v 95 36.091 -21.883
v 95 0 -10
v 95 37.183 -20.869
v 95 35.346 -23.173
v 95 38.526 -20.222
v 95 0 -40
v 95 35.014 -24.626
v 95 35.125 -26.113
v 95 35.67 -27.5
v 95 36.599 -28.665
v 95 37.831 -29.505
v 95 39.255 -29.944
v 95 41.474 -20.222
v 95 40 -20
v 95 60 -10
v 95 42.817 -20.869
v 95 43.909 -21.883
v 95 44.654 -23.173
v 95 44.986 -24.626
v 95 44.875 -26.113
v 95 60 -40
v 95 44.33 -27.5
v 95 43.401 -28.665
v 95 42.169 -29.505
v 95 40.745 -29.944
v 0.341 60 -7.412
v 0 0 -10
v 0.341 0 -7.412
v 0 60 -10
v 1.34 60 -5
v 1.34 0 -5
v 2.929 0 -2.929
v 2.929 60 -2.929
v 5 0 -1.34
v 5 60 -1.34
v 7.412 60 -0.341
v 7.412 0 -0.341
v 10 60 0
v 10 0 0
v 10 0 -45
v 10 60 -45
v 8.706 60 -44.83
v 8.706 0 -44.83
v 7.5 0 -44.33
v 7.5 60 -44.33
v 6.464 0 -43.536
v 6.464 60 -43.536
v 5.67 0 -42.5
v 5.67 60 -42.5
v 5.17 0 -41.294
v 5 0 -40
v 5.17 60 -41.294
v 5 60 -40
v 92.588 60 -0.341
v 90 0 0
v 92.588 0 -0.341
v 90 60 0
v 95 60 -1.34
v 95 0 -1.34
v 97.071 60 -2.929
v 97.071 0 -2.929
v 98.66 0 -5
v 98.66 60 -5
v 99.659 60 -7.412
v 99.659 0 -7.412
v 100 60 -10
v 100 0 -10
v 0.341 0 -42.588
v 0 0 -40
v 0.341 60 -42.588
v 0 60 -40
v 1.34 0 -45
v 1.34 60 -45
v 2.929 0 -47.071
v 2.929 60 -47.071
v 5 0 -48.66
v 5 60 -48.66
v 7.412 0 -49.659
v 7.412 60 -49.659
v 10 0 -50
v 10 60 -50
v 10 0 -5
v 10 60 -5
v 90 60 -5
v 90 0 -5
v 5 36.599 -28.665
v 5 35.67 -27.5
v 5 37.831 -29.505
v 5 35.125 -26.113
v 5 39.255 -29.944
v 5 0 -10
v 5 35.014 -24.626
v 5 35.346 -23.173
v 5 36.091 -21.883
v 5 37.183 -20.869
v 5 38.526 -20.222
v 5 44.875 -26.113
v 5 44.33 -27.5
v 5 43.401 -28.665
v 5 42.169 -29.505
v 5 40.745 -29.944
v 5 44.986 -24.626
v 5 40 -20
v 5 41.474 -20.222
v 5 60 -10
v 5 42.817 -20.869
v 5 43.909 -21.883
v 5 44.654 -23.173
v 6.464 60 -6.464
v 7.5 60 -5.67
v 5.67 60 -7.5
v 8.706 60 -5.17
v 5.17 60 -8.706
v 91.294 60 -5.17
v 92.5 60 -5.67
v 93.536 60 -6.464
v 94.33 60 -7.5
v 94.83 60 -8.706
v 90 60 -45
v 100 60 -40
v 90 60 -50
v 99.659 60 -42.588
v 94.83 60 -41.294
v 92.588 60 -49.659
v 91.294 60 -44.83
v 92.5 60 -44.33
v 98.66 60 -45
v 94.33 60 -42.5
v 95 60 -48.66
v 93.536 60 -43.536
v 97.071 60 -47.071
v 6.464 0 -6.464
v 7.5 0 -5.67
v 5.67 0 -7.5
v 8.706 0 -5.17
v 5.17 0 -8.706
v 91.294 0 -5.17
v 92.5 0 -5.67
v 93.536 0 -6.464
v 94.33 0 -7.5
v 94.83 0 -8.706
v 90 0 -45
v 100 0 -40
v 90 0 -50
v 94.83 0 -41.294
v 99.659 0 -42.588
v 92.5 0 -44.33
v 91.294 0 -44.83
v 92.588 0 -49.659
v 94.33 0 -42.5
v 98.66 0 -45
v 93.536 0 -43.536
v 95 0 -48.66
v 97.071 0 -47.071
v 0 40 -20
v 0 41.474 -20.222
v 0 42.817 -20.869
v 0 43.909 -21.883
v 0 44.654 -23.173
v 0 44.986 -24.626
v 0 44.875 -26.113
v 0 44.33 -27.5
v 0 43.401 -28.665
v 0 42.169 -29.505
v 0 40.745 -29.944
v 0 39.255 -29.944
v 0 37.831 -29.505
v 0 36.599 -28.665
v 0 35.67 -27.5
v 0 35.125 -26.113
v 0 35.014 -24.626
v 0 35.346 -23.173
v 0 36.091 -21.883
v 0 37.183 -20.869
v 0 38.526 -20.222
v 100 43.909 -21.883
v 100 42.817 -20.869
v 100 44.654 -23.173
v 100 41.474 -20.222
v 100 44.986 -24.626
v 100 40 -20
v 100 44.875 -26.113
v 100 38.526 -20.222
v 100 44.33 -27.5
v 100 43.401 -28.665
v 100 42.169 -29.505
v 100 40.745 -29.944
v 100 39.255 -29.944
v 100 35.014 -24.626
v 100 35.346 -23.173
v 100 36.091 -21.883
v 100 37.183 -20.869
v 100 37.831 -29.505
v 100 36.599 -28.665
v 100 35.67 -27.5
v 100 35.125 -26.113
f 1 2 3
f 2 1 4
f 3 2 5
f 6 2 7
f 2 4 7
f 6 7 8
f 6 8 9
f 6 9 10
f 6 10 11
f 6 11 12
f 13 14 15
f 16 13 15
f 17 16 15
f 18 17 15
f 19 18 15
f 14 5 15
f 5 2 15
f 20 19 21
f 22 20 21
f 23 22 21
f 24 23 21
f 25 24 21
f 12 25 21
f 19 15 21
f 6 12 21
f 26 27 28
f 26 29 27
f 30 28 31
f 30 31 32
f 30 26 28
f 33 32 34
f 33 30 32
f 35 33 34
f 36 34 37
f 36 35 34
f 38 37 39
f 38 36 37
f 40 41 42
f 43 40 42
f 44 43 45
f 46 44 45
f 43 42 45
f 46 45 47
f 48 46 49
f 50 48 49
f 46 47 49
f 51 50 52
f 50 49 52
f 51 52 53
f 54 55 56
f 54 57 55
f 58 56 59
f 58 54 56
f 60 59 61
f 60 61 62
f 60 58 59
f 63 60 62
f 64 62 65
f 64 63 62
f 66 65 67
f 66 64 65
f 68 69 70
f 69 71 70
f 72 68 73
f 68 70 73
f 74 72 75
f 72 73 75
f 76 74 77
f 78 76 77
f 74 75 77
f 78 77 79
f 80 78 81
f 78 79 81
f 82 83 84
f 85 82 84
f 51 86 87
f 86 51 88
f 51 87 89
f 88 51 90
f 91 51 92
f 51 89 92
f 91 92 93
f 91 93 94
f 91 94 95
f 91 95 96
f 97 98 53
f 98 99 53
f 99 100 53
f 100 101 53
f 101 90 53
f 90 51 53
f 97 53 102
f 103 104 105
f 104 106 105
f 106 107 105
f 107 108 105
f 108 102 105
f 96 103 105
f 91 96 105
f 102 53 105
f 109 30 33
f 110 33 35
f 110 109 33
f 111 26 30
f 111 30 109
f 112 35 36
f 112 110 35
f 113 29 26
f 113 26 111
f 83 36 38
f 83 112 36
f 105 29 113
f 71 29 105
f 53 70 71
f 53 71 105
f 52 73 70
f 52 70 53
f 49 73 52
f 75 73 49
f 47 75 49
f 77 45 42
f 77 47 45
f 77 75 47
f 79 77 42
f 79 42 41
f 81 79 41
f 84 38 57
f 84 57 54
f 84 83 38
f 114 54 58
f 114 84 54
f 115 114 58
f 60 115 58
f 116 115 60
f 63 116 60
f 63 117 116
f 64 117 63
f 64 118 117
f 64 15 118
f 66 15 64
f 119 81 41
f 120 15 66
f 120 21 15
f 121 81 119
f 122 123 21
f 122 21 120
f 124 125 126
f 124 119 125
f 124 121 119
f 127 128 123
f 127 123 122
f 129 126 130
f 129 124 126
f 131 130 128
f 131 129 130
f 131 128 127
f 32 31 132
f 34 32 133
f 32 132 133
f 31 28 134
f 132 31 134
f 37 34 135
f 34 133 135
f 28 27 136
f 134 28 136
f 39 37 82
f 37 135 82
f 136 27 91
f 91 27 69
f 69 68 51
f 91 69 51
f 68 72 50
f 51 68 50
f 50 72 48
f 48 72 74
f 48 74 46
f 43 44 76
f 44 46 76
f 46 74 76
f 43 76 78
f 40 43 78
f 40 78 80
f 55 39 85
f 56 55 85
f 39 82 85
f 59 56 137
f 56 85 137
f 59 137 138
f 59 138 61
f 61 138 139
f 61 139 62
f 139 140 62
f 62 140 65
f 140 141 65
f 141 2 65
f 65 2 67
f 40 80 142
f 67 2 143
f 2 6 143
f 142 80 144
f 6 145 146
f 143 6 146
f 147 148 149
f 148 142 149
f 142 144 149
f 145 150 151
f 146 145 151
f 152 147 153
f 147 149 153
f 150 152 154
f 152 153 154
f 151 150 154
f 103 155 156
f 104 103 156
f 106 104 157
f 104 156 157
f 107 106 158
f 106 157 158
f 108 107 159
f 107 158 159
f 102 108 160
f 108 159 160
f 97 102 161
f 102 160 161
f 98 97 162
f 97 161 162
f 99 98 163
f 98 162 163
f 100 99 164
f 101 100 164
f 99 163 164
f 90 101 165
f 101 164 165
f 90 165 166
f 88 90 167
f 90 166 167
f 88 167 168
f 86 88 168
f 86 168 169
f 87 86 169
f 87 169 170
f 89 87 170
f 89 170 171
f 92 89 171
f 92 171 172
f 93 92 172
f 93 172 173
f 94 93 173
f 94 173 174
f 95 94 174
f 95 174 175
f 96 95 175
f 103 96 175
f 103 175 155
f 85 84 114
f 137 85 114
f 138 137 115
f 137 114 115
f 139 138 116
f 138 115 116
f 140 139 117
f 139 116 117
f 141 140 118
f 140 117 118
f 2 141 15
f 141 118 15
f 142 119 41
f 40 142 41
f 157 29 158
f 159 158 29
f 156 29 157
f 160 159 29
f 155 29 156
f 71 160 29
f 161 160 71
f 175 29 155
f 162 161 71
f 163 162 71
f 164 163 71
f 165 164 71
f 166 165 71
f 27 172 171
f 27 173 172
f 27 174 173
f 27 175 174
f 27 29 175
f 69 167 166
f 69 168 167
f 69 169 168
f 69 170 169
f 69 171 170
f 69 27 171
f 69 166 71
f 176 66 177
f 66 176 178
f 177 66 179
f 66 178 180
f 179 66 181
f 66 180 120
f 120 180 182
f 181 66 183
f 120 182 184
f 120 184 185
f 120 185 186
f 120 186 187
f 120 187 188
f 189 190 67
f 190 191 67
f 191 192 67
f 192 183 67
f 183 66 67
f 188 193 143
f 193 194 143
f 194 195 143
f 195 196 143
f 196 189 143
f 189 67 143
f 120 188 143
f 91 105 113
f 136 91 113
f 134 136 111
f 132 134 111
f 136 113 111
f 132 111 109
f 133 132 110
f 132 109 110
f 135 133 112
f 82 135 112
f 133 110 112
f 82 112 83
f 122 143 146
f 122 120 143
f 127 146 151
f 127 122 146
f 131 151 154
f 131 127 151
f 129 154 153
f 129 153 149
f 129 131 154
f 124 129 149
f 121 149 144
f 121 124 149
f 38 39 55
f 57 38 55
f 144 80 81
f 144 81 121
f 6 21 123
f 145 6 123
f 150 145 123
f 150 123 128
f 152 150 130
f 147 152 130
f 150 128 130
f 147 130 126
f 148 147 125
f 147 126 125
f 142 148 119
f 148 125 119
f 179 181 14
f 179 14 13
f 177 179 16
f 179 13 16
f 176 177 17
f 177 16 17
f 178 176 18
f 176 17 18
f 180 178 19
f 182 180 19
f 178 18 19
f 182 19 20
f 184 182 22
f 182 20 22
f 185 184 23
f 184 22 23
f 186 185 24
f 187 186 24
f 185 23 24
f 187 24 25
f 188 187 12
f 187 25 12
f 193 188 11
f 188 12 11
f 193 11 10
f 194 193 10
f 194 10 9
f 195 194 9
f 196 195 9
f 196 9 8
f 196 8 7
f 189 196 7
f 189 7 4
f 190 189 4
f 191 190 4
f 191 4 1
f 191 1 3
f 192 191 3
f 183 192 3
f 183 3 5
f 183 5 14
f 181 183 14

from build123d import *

# Parameters (mm, degrees)
SKETCH1_W           = 100
SKETCH1_H           = 50
BOSS_EXTRUDE1_DEPTH = 60
FILLET2_R           = 10
CUT_EXTRUDE1_DEPTH  = 80
SKETCH2_R           = 5
CUT_EXTRUDE2_DEPTH  = 127.885775404


with BuildPart() as part:
    # Sketch1 → Boss-Extrude1 (new body)
    with BuildSketch(Plane(origin=(0, 0, 0), x_dir=(1, 0, 0), z_dir=(0, 1, 0))):
        with Locations((50, 25)):
            Rectangle(SKETCH1_W, SKETCH1_H)
    extrude(amount=BOSS_EXTRUDE1_DEPTH)

    # Fillet2
    fillet2_edges = [part.edges().sort_by_distance(p)[0] for p in [
        (0, 30, -50),
        (100, 30, -50),
        (100, 30, 0),
        (0, 30, 0),
    ]]
    fillet(fillet2_edges, radius=FILLET2_R)

    # 3DSketch1 → Cut-Extrude1 (cut)
    with BuildSketch(Plane(origin=(10, 60, -5), x_dir=(0.924678098474716, 0, -0.38074980525429475), z_dir=(0, 1, 0))):
        with BuildLine():
            Line((0, 0), (73.974247878, -30.45998442))
            ThreePointArc((73.974247878, -30.45998442), (77.801073827, -30.451978543), (80.501387397, -27.740342954))
            Line((80.501387397, -27.740342954), (91.923881554, 0))
            ThreePointArc((91.923881554, 0), (91.915875677, 3.826825949), (89.204240088, 6.527139519))
            Line((89.204240088, 6.527139519), (15.22999221, 36.987123939))
            ThreePointArc((15.22999221, 36.987123939), (11.403166261, 36.979118062), (8.702852692, 34.267482473))
            Line((8.702852692, 34.267482473), (-2.719641466, 6.527139519))
            ThreePointArc((-2.719641466, 6.527139519), (-2.711635589, 2.700313569), (0, 0))
        make_face()
    extrude(amount=-CUT_EXTRUDE1_DEPTH, mode=Mode.SUBTRACT)

    # Sketch2 → Cut-Extrude2 (cut, through all)
    with BuildSketch(Plane.ZY):
        with Locations((-25, 40)):
            Circle(SKETCH2_R)
    extrude(amount=-CUT_EXTRUDE2_DEPTH, mode=Mode.SUBTRACT)


solid = part.part
